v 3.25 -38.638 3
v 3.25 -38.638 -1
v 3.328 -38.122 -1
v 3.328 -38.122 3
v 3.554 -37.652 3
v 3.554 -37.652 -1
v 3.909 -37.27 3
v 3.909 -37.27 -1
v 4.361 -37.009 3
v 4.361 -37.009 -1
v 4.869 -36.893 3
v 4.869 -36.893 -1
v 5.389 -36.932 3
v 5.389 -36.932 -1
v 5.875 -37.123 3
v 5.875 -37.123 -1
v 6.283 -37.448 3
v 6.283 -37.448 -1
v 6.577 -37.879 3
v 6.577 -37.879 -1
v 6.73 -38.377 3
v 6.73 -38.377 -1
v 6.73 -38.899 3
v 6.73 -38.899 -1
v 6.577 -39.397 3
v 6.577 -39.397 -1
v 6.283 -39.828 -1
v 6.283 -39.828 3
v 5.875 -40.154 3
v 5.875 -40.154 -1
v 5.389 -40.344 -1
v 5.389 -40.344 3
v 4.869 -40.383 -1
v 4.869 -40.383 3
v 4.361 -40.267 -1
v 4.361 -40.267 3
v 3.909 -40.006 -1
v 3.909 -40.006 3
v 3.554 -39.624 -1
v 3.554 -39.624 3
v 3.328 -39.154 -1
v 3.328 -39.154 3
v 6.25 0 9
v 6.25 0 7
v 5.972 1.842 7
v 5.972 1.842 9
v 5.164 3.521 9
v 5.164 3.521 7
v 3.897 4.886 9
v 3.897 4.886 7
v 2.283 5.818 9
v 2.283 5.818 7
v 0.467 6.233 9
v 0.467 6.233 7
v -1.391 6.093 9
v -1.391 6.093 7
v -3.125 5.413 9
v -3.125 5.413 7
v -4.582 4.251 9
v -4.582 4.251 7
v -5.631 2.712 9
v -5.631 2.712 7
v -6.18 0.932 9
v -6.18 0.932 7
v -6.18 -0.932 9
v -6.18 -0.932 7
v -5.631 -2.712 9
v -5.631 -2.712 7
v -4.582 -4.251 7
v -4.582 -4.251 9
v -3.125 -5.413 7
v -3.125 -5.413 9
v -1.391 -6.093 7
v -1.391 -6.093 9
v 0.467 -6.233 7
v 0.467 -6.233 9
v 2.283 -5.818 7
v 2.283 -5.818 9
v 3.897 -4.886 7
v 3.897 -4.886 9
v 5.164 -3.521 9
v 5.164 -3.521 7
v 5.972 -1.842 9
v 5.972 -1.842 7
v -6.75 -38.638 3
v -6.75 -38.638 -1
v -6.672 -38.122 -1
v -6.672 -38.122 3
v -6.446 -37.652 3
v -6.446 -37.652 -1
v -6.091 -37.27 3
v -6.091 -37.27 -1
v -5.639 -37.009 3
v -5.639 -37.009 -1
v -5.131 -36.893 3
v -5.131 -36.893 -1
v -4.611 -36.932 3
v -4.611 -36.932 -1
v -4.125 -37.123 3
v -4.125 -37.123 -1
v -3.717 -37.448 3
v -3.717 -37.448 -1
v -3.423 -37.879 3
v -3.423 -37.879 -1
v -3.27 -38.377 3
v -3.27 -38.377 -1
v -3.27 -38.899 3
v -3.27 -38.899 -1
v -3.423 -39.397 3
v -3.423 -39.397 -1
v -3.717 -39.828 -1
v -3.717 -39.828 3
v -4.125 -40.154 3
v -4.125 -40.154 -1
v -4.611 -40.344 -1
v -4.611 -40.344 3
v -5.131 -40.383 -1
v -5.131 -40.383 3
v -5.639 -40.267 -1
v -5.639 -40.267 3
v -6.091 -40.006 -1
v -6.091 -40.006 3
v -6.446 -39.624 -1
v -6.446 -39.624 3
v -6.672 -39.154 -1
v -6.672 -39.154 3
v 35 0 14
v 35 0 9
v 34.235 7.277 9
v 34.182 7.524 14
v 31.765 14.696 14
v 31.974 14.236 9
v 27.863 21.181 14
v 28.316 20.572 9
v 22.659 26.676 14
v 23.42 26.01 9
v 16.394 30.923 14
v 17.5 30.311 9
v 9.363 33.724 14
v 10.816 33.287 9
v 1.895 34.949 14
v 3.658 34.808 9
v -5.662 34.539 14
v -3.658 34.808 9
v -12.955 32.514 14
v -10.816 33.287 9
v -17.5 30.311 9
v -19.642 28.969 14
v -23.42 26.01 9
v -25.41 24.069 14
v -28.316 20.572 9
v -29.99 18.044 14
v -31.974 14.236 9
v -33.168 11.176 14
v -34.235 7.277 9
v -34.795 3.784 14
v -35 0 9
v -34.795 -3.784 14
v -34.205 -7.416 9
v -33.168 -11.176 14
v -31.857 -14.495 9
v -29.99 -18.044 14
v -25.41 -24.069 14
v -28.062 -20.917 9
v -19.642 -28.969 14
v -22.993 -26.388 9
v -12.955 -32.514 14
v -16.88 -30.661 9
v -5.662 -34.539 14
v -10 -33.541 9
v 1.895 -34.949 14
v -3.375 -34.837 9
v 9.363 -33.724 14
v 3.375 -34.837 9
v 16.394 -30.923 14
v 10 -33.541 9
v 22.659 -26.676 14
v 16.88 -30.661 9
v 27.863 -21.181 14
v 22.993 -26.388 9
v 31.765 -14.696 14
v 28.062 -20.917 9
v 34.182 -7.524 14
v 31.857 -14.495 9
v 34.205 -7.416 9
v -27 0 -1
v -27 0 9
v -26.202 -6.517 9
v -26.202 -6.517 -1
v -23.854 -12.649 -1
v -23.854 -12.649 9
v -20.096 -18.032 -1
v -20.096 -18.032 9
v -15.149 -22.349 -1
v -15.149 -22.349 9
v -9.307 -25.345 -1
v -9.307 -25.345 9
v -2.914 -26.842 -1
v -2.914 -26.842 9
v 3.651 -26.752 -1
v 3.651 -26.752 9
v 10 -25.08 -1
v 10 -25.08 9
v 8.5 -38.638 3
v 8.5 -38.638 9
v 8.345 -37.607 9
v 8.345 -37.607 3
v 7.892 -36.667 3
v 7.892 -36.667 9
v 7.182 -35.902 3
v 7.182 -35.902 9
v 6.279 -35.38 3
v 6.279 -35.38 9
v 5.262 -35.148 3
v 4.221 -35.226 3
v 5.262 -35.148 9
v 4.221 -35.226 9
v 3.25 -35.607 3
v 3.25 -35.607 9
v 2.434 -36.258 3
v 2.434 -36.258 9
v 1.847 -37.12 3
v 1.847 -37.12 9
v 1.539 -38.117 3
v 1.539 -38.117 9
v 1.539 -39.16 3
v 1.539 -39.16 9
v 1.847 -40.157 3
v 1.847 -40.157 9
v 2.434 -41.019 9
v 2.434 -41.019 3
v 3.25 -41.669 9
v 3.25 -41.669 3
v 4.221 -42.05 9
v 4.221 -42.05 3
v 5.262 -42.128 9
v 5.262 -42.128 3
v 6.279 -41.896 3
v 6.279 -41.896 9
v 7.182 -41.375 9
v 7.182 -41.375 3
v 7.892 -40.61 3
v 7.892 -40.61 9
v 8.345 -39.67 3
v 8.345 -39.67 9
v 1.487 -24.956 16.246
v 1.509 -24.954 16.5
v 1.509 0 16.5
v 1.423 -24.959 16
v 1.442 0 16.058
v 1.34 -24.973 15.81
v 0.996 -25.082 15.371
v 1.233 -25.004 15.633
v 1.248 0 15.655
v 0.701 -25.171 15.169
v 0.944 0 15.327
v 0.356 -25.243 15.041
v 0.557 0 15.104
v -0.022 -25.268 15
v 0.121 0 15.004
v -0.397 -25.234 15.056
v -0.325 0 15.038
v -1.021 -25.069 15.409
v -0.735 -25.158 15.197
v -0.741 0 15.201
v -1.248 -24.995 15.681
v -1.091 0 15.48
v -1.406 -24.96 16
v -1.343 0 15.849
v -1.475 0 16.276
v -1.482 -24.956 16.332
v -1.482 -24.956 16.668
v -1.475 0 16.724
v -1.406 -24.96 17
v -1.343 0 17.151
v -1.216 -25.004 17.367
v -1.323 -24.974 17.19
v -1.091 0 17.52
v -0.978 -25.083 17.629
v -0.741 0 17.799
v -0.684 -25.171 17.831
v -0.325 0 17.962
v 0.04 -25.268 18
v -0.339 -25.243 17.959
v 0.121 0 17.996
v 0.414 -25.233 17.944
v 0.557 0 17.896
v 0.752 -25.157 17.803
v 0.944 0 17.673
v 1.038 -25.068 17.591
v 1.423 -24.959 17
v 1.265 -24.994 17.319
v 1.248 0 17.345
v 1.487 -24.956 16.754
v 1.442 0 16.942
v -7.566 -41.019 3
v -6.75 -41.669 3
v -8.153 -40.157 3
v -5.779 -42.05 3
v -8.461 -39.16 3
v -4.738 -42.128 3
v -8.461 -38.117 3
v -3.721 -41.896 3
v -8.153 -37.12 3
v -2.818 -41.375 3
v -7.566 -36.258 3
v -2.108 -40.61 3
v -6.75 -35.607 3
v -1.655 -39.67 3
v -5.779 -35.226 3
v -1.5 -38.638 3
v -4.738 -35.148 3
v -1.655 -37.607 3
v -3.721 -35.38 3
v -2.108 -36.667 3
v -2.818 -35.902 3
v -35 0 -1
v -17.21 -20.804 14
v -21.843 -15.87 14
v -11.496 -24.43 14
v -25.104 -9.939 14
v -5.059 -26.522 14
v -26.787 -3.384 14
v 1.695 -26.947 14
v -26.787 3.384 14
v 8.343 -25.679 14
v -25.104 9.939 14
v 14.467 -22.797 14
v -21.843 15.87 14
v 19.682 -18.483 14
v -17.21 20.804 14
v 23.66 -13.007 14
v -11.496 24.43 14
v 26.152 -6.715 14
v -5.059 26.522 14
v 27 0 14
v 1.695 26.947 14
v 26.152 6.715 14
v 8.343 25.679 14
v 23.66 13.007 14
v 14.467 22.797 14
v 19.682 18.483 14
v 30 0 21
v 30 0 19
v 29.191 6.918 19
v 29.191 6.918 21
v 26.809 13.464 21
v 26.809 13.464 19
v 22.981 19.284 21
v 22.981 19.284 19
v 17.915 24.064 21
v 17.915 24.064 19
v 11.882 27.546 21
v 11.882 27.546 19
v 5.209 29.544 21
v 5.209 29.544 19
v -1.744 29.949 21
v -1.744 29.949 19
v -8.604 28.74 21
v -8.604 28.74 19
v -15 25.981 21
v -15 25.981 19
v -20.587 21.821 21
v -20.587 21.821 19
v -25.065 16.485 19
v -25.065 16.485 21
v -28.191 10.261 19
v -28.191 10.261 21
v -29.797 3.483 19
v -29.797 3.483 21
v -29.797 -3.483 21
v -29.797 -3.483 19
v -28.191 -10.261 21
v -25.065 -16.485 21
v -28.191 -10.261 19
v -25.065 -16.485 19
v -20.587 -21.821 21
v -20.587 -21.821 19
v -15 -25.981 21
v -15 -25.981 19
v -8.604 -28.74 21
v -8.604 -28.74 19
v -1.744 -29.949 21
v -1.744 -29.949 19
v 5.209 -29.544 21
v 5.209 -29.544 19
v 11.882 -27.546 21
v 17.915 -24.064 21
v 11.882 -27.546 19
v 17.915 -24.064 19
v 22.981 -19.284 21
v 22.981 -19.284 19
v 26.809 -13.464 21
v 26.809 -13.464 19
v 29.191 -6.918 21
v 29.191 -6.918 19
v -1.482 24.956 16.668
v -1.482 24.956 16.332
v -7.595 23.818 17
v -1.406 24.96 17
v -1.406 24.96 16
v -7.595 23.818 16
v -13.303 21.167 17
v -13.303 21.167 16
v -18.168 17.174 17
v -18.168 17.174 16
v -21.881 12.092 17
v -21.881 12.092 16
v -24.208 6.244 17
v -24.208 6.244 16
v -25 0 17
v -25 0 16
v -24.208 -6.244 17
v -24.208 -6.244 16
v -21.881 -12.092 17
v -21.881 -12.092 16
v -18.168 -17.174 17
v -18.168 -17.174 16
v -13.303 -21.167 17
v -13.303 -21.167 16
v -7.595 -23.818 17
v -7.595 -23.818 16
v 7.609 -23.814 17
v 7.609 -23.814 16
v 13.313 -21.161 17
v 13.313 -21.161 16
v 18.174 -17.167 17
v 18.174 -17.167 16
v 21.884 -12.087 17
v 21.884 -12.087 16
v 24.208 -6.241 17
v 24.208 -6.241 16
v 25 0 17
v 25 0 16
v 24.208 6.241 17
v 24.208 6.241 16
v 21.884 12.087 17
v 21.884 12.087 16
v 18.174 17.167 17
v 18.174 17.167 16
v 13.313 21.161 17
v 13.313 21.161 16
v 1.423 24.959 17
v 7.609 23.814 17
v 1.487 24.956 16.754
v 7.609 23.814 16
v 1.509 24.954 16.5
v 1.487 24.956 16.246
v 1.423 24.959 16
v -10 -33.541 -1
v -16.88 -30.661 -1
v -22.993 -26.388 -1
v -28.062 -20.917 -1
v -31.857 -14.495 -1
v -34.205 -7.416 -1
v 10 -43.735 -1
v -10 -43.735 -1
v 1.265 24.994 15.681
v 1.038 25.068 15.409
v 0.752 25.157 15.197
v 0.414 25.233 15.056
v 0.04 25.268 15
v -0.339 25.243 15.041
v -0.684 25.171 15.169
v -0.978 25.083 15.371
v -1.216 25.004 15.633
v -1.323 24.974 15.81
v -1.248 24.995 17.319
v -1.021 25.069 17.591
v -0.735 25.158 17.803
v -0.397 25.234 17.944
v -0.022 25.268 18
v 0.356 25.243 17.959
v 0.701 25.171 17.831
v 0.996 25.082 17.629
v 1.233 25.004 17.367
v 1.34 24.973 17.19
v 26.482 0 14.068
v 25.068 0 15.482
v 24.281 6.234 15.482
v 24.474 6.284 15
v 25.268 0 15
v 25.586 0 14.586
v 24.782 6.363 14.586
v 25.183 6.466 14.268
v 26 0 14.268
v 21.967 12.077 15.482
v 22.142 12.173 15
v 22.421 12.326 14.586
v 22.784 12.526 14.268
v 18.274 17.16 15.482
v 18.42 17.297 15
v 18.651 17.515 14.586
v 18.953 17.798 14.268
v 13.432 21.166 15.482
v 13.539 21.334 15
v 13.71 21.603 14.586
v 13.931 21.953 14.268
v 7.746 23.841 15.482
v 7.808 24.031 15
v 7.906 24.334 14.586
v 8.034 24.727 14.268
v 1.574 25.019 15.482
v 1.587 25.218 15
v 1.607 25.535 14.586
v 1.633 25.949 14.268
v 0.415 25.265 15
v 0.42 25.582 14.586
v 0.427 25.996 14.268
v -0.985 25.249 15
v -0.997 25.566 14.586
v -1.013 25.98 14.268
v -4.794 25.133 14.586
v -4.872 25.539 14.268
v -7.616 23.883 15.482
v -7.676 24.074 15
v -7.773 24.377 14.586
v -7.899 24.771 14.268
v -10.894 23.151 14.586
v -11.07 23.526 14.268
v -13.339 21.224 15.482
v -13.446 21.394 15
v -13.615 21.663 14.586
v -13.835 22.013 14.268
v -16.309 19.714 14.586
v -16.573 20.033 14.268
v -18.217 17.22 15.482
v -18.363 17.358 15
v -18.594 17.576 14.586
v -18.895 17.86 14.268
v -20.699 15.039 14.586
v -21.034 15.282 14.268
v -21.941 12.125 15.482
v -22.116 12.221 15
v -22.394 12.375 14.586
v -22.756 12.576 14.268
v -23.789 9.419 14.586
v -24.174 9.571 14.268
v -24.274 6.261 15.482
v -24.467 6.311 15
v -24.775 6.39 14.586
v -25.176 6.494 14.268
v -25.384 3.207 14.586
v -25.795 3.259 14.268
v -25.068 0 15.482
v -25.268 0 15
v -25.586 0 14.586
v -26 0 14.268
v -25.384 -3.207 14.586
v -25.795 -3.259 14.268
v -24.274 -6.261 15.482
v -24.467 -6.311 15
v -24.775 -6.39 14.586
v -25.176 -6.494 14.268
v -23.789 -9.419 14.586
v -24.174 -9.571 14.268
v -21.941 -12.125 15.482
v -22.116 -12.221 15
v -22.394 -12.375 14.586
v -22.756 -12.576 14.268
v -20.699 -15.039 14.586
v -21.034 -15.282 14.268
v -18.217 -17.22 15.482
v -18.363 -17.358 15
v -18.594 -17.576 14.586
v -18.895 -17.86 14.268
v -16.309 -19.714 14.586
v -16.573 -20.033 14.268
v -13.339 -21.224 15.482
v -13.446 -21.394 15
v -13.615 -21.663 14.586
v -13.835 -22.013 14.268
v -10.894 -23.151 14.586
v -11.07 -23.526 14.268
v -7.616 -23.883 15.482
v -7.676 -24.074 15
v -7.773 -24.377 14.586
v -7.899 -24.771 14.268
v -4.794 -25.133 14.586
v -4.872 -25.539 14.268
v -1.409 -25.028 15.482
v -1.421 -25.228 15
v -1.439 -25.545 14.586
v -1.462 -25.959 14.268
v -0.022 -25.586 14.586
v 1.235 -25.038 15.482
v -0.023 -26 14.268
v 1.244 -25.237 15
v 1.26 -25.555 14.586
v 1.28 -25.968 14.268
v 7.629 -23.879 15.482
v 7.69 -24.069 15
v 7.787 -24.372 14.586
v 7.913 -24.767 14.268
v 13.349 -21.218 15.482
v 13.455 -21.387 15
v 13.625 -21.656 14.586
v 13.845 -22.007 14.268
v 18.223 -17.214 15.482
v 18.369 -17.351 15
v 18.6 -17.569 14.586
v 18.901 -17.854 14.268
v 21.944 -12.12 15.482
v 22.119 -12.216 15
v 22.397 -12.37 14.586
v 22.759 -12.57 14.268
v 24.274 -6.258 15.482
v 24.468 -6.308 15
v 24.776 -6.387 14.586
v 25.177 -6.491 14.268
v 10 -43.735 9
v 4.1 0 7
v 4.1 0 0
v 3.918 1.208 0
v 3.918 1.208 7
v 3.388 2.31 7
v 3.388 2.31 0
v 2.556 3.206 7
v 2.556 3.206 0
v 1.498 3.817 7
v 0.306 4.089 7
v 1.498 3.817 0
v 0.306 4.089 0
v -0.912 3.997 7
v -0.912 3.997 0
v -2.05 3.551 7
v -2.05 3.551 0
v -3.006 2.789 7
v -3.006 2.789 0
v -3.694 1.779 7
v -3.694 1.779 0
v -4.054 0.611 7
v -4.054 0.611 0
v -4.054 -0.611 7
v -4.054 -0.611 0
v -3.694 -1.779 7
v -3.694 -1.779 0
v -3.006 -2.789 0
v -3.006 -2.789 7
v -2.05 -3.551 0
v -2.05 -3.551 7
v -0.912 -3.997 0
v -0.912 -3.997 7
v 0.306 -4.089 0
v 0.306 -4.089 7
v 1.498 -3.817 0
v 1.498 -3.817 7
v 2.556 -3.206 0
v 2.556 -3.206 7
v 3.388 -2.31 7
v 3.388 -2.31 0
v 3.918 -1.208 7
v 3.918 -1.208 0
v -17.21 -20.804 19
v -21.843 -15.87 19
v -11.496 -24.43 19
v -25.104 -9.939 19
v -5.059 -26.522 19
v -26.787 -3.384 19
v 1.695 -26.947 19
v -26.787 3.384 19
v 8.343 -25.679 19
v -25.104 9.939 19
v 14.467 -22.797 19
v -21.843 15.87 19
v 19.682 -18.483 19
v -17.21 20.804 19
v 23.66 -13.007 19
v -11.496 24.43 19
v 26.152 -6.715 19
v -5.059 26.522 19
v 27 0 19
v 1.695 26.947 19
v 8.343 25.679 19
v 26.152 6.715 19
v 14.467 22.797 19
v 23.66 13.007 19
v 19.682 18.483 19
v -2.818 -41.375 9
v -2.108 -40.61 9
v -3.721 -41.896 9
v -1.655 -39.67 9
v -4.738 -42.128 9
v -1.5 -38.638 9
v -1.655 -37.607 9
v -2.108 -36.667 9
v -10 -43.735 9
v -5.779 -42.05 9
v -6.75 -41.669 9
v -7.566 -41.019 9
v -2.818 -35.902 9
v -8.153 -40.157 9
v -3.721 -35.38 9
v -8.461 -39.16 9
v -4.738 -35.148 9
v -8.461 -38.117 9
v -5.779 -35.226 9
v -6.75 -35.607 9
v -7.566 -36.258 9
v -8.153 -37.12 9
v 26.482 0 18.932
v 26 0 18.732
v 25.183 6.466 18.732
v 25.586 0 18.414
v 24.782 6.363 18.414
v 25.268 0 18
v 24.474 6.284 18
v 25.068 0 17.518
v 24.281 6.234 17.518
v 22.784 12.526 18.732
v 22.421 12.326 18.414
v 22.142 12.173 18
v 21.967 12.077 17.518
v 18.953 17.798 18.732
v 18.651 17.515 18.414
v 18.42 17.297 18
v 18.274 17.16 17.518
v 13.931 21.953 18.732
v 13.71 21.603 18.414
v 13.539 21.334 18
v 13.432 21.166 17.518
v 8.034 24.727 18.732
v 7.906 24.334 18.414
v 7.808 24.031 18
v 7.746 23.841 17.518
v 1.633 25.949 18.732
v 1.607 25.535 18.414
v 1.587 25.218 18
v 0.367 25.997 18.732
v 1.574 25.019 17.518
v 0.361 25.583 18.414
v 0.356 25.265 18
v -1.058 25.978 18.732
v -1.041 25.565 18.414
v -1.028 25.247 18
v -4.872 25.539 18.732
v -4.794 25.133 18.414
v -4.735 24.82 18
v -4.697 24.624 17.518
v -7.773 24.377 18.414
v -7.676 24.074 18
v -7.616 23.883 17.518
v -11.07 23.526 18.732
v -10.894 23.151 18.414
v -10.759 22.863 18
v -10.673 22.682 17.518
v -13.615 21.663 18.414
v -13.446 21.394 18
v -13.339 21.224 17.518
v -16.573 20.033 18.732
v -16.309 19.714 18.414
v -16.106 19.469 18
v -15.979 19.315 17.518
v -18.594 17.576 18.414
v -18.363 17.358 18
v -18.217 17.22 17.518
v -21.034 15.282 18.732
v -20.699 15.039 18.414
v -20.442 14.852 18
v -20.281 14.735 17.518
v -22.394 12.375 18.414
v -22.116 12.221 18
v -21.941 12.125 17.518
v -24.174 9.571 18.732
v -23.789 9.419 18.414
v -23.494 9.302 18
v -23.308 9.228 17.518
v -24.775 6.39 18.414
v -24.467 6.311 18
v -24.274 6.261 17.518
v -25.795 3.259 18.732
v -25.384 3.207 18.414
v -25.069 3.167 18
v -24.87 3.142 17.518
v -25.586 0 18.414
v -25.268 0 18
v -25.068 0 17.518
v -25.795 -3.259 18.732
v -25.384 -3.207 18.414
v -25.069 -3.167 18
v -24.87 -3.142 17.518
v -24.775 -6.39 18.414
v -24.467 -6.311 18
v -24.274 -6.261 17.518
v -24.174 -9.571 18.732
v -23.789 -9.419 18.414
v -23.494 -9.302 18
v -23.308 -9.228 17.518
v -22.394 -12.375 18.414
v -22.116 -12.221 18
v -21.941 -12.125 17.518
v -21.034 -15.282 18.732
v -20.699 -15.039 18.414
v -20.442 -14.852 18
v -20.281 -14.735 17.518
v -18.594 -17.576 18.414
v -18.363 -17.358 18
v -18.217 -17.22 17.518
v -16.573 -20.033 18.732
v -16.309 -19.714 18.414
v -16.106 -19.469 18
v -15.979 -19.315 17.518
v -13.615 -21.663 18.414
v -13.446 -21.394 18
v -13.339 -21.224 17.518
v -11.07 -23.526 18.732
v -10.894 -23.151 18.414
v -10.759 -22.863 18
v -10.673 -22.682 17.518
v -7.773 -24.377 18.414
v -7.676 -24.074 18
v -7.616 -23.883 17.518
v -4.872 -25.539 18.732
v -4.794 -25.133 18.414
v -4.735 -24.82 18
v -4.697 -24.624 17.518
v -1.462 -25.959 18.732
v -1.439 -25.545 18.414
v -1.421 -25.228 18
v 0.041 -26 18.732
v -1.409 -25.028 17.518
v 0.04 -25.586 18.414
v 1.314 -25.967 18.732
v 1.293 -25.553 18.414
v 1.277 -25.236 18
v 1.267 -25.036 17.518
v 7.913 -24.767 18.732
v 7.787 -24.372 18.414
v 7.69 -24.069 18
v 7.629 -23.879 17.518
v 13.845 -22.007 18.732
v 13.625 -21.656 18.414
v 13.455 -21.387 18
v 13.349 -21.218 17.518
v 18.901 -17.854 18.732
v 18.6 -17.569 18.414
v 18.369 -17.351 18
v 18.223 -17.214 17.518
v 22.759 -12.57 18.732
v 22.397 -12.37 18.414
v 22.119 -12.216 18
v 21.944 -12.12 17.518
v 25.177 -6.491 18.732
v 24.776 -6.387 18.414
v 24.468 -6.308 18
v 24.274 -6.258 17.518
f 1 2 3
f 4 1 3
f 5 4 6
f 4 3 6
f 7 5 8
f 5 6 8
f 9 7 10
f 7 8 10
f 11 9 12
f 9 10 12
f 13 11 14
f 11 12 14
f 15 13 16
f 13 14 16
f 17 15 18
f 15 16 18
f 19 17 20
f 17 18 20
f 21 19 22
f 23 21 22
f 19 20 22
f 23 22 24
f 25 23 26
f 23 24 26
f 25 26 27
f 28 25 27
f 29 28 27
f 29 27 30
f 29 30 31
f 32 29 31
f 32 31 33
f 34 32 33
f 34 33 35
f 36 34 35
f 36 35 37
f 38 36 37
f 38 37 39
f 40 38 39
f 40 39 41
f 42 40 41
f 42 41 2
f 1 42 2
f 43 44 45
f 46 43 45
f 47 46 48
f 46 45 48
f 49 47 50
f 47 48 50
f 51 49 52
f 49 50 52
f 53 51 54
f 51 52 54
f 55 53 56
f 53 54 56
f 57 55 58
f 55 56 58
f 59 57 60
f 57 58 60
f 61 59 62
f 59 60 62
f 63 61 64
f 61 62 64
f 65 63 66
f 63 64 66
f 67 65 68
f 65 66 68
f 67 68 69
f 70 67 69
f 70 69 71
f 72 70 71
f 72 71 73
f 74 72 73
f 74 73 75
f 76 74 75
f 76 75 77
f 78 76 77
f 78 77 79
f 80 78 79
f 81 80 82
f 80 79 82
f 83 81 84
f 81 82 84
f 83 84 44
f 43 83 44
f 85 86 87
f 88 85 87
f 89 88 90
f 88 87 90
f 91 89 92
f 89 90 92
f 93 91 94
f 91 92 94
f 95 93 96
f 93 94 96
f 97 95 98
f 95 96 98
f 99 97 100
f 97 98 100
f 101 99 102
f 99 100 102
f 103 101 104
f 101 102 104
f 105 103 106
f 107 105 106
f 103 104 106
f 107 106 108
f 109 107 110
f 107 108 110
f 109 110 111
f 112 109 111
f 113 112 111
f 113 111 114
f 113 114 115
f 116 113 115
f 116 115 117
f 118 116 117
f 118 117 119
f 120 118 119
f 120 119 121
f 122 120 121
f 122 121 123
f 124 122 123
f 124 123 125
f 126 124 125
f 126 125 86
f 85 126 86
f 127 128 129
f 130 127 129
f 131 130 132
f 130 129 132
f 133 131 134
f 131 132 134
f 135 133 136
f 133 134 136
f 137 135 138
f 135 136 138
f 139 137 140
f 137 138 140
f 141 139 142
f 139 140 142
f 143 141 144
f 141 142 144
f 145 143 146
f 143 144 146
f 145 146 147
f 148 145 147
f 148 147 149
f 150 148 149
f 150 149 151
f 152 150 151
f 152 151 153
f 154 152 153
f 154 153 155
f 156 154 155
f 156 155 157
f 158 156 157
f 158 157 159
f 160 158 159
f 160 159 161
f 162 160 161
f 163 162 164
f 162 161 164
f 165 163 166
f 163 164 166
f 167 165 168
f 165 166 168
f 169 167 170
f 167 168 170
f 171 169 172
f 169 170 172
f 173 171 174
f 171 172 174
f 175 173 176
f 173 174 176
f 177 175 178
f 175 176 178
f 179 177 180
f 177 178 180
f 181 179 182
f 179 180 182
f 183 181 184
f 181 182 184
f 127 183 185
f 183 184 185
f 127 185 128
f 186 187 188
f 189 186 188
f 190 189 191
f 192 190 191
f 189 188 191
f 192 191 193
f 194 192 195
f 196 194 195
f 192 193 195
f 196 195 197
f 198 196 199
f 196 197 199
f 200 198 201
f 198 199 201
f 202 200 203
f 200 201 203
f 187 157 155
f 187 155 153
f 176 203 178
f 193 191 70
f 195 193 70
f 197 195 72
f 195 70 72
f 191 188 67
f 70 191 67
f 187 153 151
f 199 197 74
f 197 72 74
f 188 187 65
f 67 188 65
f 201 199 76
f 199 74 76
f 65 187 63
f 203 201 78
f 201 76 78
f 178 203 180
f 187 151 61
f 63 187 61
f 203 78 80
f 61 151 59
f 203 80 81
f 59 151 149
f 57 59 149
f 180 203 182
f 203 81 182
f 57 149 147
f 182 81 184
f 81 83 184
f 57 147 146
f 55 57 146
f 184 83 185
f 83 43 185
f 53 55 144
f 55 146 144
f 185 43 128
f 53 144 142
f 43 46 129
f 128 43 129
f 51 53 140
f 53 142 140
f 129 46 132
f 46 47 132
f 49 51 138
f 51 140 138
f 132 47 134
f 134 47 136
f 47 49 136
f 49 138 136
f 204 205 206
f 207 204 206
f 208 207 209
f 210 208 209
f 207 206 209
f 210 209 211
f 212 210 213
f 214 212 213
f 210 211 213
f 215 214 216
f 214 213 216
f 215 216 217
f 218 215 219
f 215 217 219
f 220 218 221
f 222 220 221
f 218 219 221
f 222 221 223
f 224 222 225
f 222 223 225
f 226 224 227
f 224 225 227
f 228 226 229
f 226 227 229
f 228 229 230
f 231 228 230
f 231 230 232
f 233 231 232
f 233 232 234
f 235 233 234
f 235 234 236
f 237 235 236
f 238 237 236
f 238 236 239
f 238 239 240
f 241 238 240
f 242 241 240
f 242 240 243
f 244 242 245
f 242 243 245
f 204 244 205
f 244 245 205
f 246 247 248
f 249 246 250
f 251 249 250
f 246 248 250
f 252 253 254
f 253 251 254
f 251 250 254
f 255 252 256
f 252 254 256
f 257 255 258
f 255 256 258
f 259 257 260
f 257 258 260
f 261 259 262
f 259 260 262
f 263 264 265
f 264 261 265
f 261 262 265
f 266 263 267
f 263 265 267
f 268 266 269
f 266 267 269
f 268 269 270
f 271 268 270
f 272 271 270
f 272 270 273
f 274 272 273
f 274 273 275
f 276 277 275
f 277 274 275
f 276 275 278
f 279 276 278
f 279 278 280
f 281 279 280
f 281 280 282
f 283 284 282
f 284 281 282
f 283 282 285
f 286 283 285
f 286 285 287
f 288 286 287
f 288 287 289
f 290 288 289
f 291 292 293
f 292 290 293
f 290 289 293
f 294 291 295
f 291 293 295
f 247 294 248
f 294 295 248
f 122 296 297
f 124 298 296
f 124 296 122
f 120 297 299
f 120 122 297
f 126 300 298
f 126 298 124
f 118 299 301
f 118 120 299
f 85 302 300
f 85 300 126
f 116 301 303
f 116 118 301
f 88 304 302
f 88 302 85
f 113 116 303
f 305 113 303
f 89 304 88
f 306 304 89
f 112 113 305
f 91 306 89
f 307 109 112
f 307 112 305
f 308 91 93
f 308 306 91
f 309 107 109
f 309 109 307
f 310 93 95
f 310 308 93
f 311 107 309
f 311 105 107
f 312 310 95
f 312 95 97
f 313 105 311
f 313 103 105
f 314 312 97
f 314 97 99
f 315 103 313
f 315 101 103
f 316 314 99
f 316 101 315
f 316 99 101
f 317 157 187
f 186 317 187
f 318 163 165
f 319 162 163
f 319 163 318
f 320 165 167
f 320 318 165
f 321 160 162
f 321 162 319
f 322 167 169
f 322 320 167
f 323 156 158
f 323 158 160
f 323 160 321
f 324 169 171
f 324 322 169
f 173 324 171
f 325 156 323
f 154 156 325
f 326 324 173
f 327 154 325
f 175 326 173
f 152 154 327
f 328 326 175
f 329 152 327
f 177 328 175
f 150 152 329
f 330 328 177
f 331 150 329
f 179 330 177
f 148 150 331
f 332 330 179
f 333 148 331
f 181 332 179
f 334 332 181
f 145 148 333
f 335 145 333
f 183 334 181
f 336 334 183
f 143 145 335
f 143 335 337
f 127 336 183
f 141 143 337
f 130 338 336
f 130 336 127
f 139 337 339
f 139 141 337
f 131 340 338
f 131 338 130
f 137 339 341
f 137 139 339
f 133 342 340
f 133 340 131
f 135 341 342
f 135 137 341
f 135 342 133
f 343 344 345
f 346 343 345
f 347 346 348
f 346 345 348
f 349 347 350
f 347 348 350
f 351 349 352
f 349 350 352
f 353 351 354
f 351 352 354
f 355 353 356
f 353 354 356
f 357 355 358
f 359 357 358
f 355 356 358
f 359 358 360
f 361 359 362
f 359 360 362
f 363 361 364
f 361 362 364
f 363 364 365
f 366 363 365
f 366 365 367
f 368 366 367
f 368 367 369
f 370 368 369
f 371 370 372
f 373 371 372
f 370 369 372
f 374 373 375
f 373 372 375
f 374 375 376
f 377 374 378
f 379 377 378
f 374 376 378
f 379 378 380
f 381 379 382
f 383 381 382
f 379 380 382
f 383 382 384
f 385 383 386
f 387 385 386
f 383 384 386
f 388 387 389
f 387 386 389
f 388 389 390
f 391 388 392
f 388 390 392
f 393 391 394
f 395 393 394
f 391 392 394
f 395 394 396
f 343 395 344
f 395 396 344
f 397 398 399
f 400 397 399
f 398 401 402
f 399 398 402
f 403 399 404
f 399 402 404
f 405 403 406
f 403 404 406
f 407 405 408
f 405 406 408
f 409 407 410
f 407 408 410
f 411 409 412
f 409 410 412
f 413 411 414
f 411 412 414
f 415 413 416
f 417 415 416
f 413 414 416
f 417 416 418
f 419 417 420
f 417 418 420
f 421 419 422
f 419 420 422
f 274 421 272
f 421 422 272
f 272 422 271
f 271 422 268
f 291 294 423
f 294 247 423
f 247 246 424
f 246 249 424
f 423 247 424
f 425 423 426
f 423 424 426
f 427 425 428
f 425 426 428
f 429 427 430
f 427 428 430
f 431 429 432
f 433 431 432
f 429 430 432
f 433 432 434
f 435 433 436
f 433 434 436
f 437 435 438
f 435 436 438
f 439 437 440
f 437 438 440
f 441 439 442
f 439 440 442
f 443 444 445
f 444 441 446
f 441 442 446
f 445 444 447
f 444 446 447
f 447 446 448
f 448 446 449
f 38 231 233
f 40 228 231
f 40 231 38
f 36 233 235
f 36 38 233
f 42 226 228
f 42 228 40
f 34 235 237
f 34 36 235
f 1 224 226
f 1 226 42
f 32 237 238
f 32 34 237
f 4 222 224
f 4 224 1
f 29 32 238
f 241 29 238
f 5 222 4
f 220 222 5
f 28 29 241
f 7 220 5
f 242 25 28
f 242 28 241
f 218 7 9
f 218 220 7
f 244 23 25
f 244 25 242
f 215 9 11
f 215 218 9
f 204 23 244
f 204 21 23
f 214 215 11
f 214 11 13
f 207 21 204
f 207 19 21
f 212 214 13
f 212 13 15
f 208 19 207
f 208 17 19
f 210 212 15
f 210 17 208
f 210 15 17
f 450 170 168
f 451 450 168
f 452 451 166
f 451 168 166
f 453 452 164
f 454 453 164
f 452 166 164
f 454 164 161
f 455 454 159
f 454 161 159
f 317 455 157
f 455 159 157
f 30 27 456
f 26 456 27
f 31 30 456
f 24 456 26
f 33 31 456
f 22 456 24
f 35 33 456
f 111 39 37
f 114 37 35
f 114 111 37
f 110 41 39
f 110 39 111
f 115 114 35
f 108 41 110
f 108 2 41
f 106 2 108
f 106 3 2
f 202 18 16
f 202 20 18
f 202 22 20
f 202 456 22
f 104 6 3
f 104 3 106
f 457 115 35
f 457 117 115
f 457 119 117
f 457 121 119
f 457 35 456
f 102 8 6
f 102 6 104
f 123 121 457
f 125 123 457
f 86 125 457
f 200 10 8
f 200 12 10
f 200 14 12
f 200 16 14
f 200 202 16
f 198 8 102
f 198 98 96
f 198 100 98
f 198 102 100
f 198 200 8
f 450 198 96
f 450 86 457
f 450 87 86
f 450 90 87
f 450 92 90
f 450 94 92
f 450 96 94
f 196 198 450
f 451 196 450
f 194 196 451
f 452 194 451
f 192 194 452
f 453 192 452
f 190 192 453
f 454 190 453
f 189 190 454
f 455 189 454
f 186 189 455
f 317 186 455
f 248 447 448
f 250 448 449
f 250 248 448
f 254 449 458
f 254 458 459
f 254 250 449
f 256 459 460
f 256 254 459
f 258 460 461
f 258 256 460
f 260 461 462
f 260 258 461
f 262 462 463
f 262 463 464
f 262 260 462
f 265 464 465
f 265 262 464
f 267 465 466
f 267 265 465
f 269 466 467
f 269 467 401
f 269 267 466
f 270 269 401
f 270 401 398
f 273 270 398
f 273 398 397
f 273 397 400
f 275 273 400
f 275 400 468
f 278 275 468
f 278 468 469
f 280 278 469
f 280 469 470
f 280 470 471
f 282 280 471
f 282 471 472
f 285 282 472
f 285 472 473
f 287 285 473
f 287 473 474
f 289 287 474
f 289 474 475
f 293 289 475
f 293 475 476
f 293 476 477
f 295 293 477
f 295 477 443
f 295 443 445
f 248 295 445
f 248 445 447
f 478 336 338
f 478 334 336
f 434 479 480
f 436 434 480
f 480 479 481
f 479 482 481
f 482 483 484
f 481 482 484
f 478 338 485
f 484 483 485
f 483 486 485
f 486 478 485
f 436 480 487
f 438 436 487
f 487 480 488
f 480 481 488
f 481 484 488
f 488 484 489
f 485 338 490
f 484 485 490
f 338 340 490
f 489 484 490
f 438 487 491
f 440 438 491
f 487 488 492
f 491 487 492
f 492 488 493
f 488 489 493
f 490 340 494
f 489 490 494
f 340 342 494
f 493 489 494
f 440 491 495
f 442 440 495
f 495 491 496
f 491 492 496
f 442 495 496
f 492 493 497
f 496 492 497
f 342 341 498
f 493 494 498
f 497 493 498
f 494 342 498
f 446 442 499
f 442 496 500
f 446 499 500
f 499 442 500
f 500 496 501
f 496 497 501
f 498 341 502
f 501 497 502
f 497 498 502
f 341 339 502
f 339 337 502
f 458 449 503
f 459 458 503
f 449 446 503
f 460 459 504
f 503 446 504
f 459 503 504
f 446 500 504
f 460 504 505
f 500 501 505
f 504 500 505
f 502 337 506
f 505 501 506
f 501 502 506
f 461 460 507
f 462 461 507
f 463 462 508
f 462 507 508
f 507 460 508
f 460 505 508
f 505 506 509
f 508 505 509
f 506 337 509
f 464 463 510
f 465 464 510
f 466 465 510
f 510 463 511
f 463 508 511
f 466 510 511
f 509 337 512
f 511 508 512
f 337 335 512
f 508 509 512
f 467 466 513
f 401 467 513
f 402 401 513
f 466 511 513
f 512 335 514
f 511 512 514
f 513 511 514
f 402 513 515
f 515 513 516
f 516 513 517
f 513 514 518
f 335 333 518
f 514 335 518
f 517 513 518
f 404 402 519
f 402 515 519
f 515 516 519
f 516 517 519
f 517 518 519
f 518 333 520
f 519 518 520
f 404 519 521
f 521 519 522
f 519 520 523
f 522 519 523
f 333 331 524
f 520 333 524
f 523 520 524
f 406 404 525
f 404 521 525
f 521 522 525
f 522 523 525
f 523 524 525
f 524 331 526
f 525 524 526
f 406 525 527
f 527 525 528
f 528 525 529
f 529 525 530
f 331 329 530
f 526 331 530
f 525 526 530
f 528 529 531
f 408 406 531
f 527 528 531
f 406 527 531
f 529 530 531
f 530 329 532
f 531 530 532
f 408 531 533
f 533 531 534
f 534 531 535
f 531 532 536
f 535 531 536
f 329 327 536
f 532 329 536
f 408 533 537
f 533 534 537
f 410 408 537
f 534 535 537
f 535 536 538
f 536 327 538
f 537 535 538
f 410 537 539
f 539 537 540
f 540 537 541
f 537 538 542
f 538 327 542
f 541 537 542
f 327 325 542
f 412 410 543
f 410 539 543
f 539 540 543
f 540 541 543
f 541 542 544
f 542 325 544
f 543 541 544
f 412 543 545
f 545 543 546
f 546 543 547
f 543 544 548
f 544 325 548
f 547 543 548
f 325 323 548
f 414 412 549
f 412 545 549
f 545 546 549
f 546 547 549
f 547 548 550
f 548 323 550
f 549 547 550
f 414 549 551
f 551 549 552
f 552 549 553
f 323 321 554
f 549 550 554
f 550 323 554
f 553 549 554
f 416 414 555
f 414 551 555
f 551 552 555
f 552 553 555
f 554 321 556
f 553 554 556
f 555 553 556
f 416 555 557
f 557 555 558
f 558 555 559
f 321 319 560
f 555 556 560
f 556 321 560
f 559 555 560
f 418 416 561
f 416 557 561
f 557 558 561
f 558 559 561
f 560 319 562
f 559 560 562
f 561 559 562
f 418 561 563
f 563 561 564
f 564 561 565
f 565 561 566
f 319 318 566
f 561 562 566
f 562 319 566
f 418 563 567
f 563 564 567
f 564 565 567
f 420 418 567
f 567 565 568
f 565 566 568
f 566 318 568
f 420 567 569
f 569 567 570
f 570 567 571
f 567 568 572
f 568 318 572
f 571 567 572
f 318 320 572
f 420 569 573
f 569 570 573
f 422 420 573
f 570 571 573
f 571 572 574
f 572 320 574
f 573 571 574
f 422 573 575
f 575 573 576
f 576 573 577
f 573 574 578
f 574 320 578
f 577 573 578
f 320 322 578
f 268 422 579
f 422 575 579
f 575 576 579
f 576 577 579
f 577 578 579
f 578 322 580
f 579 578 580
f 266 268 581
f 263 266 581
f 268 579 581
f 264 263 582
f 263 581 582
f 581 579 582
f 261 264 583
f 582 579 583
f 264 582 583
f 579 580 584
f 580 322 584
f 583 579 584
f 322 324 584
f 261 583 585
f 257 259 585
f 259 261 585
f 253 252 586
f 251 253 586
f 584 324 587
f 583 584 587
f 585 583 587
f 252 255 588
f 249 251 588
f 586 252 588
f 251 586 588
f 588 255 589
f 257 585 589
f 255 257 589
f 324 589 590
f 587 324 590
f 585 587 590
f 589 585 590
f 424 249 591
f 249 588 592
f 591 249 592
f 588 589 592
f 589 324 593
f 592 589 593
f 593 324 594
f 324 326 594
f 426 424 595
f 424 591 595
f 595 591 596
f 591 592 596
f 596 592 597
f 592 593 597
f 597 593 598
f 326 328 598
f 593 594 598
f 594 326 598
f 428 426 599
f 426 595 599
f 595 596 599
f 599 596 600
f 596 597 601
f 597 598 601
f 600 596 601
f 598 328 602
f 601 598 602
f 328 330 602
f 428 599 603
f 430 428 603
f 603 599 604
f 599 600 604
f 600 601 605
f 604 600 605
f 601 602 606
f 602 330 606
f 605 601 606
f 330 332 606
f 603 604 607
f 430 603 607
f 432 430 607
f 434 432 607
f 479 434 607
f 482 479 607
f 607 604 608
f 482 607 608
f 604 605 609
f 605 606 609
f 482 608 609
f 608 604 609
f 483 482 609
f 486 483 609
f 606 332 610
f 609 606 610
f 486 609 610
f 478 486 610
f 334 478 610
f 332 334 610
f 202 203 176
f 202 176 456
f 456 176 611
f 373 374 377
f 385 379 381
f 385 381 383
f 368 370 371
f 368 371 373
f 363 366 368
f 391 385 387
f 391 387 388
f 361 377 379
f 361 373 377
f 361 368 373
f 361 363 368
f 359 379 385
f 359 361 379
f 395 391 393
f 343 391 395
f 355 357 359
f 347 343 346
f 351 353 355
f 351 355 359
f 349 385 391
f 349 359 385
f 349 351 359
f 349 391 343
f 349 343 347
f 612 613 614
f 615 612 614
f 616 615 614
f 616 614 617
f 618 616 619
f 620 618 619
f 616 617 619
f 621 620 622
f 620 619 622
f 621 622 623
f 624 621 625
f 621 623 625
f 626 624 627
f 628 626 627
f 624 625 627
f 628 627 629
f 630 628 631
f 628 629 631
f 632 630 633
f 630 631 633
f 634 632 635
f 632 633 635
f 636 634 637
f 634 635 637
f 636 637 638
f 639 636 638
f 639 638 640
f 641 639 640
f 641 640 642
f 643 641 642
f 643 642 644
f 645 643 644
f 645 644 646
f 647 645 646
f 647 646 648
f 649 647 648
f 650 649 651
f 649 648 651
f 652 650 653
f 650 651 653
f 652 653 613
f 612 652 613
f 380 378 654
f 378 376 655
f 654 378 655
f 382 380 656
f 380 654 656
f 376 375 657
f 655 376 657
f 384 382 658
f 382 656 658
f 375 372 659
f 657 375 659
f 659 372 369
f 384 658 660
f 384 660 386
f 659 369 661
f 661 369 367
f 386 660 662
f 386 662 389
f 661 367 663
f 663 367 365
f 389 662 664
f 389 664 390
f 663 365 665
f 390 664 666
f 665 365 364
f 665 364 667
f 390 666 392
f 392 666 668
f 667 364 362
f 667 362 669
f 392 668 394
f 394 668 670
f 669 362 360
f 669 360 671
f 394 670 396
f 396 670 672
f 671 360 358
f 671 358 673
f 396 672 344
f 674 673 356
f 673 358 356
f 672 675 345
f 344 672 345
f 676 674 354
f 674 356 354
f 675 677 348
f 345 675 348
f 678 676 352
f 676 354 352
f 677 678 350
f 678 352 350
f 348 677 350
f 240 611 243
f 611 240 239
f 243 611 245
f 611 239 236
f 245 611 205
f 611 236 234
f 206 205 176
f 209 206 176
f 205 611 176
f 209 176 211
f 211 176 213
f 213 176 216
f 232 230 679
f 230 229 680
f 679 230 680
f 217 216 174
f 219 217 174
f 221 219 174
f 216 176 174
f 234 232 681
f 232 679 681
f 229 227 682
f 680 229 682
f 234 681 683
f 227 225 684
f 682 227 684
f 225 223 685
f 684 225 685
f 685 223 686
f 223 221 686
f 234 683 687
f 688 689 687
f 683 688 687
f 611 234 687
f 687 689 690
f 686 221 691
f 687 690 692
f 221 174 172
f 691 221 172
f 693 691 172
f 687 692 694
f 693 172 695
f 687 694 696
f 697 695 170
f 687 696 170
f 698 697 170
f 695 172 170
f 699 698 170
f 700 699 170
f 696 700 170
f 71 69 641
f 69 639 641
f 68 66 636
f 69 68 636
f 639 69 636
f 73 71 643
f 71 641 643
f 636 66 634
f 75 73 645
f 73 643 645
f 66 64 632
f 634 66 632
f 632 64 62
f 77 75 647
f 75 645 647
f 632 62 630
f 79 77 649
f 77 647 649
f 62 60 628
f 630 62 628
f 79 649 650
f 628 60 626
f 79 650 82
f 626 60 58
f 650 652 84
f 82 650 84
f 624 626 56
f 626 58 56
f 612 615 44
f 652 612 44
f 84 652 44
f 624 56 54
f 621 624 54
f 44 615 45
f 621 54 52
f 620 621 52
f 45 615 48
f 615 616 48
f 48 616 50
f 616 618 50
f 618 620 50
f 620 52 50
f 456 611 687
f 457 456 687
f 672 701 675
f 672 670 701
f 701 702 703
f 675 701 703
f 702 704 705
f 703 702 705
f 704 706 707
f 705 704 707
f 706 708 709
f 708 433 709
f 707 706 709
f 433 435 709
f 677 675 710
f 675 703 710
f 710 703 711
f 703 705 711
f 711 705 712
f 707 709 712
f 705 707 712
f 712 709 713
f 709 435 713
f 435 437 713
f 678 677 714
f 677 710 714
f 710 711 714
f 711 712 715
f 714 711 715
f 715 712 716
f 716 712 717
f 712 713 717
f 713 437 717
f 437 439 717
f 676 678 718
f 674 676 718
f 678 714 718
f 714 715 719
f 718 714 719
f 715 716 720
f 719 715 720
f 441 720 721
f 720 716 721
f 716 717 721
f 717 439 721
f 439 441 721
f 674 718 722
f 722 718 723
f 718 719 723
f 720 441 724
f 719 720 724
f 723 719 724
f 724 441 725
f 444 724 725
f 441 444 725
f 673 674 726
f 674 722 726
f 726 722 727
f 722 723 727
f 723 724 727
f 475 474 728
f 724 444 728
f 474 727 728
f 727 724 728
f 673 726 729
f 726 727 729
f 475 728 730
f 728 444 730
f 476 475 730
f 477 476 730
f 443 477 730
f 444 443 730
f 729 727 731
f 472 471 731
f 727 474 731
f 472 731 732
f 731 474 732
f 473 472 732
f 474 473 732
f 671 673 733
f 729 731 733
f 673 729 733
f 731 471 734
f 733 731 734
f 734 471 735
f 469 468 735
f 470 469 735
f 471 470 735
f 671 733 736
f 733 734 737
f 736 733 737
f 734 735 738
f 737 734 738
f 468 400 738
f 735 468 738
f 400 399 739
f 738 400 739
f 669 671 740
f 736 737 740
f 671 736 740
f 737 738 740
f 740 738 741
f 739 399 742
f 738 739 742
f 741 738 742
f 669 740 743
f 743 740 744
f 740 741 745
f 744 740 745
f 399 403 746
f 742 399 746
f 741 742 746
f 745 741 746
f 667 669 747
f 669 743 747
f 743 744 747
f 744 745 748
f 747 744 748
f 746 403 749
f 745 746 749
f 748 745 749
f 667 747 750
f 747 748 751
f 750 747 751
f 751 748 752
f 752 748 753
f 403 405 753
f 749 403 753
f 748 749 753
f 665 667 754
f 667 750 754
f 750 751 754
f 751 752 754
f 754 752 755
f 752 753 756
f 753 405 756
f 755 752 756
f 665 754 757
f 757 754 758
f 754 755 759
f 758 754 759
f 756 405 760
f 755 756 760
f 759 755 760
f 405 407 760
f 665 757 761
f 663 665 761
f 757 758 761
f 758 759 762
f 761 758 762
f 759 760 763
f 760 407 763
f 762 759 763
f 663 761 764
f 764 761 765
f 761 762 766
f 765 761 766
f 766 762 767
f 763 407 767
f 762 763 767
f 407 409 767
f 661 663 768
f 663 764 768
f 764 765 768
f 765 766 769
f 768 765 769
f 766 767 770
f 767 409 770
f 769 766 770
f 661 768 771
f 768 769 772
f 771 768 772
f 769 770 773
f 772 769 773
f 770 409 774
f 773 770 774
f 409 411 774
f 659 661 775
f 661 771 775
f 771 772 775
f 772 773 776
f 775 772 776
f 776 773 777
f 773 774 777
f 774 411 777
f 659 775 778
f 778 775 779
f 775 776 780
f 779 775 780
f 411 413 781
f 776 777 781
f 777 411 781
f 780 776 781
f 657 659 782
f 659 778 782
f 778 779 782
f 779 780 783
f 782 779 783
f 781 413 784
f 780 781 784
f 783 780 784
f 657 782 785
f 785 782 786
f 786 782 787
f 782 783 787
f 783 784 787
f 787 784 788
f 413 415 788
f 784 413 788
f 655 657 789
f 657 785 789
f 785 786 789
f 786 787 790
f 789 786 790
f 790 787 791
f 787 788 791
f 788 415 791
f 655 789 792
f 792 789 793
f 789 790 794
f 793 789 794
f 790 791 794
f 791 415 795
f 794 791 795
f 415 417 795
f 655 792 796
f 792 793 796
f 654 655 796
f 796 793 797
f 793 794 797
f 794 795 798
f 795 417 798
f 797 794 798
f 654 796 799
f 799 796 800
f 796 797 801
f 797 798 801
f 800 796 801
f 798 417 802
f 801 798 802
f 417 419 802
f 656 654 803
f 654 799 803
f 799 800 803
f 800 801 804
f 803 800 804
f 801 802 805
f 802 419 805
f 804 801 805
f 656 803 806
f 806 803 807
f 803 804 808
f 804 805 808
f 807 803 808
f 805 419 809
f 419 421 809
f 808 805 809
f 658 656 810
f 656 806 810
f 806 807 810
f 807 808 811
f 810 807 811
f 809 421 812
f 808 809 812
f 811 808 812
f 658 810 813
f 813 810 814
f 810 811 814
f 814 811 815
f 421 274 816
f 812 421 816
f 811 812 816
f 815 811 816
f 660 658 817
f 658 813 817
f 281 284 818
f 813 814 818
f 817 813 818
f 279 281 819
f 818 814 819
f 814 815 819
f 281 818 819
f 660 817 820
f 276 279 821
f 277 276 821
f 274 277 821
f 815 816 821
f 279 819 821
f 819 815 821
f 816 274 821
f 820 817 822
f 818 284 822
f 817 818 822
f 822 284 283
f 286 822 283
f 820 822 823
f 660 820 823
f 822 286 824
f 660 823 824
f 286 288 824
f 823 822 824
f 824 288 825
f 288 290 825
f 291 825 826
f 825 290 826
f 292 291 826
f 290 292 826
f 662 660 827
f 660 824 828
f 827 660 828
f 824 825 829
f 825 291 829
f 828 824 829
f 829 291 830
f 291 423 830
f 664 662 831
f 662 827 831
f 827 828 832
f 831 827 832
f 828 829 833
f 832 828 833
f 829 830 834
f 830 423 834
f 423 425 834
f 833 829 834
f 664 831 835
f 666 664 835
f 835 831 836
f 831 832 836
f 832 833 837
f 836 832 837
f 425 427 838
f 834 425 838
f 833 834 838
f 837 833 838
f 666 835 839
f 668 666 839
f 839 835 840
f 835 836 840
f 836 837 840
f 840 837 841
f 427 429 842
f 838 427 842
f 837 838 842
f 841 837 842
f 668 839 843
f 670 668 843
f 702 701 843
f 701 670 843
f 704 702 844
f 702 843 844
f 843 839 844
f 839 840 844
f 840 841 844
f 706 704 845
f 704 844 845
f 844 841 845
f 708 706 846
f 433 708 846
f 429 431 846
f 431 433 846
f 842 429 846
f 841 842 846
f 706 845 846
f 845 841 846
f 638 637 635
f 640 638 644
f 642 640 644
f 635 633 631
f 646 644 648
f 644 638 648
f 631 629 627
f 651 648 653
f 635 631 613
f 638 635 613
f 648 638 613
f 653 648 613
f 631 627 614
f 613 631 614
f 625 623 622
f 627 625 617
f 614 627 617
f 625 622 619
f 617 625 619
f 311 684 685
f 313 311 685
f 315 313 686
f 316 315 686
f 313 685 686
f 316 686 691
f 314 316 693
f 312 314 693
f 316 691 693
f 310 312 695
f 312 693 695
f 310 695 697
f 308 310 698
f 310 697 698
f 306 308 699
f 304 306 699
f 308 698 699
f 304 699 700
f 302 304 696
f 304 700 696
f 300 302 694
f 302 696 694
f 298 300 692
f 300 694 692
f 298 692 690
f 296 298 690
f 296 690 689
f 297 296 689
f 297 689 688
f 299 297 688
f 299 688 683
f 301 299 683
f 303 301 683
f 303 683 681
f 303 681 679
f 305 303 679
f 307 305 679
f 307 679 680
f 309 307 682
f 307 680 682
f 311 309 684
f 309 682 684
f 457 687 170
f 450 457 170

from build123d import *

# Parameters (mm, degrees)
SKETCH1_R               = 4.1
BOSS_EXTRUDE1_DEPTH     = 7
SKETCH2_R               = 6.25
BOSS_EXTRUDE2_DEPTH     = 2
SKETCH3_R               = 35
BOSS_EXTRUDE3_DEPTH     = 5
SKETCH4_R               = 25
BOSS_EXTRUDE4_DEPTH     = 5
SKETCH5_R               = 30
BOSS_EXTRUDE5_DEPTH     = 2
FILLET1_R               = 2
FILLET2_R               = 2
SKETCH6_R               = 1.5
CUT_EXTRUDE1_DEPTH      = 36
CUT_EXTRUDE1_DEPTH_BACK = 36
BOSS_EXTRUDE6_DEPTH     = 10
SKETCH9_R               = 1.75
CUT_EXTRUDE2_DEPTH      = 1
CUT_EXTRUDE2_DEPTH_BACK = 23
SKETCH10_R              = 3.5
CUT_EXTRUDE3_DEPTH      = 6


with BuildPart() as part:
    # Sketch1 → Boss-Extrude1 (new body)
    with BuildSketch(Plane.XY):
        Circle(SKETCH1_R)
    extrude(amount=BOSS_EXTRUDE1_DEPTH)

    # Sketch2 → Boss-Extrude2 (add)
    with BuildSketch(Plane.XY.offset(7)):
        Circle(SKETCH2_R)
    extrude(amount=BOSS_EXTRUDE2_DEPTH)

    # Sketch3 → Boss-Extrude3 (add)
    with BuildSketch(Plane.XY.offset(9)):
        Circle(SKETCH3_R)
    extrude(amount=BOSS_EXTRUDE3_DEPTH)

    # Sketch4 → Boss-Extrude4 (add)
    with BuildSketch(Plane.XY.offset(14)):
        Circle(SKETCH4_R)
    extrude(amount=BOSS_EXTRUDE4_DEPTH)

    # Sketch5 → Boss-Extrude5 (add)
    with BuildSketch(Plane.XY.offset(19)):
        Circle(SKETCH5_R)
    extrude(amount=BOSS_EXTRUDE5_DEPTH)

    # Fillet1
    fillet1_edges = [part.edges().sort_by_distance(p)[0] for p in [
        (-25, 0, 19),
    ]]
    fillet(fillet1_edges, radius=FILLET1_R)

    # Fillet2
    fillet2_edges = [part.edges().sort_by_distance(p)[0] for p in [
        (-25, 0, 14),
    ]]
    fillet(fillet2_edges, radius=FILLET2_R)

    # Sketch6 → Cut-Extrude1 (cut, two sides)
    with BuildSketch(Plane(origin=(0, 0, 0), x_dir=(1, 0, 0), z_dir=(0, 1, 0))) as cut_extrude1_sk:
        with Locations((0.008646323, -16.5)):
            Circle(SKETCH6_R)
    extrude(amount=CUT_EXTRUDE1_DEPTH, mode=Mode.SUBTRACT)
    extrude(cut_extrude1_sk.sketch, amount=-CUT_EXTRUDE1_DEPTH_BACK, mode=Mode.SUBTRACT)

    # Sketch7 → Boss-Extrude6 (add)
    with BuildSketch(Plane(origin=(0, 0, 9), x_dir=(-1, 0, 0), z_dir=(0, 0, -1))):
        with BuildLine():
            Line((35, 0), (27, 0))
            ThreePointArc((27, 0), (15.149257408, -22.349496639), (-10, -25.079872408))
            Line((-10, -25.079872408), (-10, -43.735334875))
            Line((-10, -43.735334875), (10, -43.735334875))
            Line((10, -43.735334875), (10, -33.735334875))
            Line((10, -33.735334875), (10, -33.541019662))
            ThreePointArc((10, -33.541019662), (28.062430401, -20.916500663), (35, 0))
        make_face()
    extrude(amount=BOSS_EXTRUDE6_DEPTH)

    # Sketch9 → Cut-Extrude2 (cut, two sides)
    with BuildSketch(Plane(origin=(0, 0, -1), x_dir=(-1, 0, 0), z_dir=(0, 0, -1))) as cut_extrude2_sk:
        with Locations((5, -38.638177269)):
            Circle(SKETCH9_R)
        with Locations((-5, -38.638177269)):
            Circle(SKETCH9_R)
    extrude(amount=CUT_EXTRUDE2_DEPTH, mode=Mode.SUBTRACT)
    extrude(cut_extrude2_sk.sketch, amount=-CUT_EXTRUDE2_DEPTH_BACK, mode=Mode.SUBTRACT)

    # Sketch10 → Cut-Extrude3 (cut)
    with BuildSketch(Plane.XY.offset(9)):
        with Locations((-5, -38.638177269)):
            Circle(SKETCH10_R)
        with Locations((5, -38.638177269)):
            Circle(SKETCH10_R)
    extrude(amount=-CUT_EXTRUDE3_DEPTH, mode=Mode.SUBTRACT)


solid = part.part
